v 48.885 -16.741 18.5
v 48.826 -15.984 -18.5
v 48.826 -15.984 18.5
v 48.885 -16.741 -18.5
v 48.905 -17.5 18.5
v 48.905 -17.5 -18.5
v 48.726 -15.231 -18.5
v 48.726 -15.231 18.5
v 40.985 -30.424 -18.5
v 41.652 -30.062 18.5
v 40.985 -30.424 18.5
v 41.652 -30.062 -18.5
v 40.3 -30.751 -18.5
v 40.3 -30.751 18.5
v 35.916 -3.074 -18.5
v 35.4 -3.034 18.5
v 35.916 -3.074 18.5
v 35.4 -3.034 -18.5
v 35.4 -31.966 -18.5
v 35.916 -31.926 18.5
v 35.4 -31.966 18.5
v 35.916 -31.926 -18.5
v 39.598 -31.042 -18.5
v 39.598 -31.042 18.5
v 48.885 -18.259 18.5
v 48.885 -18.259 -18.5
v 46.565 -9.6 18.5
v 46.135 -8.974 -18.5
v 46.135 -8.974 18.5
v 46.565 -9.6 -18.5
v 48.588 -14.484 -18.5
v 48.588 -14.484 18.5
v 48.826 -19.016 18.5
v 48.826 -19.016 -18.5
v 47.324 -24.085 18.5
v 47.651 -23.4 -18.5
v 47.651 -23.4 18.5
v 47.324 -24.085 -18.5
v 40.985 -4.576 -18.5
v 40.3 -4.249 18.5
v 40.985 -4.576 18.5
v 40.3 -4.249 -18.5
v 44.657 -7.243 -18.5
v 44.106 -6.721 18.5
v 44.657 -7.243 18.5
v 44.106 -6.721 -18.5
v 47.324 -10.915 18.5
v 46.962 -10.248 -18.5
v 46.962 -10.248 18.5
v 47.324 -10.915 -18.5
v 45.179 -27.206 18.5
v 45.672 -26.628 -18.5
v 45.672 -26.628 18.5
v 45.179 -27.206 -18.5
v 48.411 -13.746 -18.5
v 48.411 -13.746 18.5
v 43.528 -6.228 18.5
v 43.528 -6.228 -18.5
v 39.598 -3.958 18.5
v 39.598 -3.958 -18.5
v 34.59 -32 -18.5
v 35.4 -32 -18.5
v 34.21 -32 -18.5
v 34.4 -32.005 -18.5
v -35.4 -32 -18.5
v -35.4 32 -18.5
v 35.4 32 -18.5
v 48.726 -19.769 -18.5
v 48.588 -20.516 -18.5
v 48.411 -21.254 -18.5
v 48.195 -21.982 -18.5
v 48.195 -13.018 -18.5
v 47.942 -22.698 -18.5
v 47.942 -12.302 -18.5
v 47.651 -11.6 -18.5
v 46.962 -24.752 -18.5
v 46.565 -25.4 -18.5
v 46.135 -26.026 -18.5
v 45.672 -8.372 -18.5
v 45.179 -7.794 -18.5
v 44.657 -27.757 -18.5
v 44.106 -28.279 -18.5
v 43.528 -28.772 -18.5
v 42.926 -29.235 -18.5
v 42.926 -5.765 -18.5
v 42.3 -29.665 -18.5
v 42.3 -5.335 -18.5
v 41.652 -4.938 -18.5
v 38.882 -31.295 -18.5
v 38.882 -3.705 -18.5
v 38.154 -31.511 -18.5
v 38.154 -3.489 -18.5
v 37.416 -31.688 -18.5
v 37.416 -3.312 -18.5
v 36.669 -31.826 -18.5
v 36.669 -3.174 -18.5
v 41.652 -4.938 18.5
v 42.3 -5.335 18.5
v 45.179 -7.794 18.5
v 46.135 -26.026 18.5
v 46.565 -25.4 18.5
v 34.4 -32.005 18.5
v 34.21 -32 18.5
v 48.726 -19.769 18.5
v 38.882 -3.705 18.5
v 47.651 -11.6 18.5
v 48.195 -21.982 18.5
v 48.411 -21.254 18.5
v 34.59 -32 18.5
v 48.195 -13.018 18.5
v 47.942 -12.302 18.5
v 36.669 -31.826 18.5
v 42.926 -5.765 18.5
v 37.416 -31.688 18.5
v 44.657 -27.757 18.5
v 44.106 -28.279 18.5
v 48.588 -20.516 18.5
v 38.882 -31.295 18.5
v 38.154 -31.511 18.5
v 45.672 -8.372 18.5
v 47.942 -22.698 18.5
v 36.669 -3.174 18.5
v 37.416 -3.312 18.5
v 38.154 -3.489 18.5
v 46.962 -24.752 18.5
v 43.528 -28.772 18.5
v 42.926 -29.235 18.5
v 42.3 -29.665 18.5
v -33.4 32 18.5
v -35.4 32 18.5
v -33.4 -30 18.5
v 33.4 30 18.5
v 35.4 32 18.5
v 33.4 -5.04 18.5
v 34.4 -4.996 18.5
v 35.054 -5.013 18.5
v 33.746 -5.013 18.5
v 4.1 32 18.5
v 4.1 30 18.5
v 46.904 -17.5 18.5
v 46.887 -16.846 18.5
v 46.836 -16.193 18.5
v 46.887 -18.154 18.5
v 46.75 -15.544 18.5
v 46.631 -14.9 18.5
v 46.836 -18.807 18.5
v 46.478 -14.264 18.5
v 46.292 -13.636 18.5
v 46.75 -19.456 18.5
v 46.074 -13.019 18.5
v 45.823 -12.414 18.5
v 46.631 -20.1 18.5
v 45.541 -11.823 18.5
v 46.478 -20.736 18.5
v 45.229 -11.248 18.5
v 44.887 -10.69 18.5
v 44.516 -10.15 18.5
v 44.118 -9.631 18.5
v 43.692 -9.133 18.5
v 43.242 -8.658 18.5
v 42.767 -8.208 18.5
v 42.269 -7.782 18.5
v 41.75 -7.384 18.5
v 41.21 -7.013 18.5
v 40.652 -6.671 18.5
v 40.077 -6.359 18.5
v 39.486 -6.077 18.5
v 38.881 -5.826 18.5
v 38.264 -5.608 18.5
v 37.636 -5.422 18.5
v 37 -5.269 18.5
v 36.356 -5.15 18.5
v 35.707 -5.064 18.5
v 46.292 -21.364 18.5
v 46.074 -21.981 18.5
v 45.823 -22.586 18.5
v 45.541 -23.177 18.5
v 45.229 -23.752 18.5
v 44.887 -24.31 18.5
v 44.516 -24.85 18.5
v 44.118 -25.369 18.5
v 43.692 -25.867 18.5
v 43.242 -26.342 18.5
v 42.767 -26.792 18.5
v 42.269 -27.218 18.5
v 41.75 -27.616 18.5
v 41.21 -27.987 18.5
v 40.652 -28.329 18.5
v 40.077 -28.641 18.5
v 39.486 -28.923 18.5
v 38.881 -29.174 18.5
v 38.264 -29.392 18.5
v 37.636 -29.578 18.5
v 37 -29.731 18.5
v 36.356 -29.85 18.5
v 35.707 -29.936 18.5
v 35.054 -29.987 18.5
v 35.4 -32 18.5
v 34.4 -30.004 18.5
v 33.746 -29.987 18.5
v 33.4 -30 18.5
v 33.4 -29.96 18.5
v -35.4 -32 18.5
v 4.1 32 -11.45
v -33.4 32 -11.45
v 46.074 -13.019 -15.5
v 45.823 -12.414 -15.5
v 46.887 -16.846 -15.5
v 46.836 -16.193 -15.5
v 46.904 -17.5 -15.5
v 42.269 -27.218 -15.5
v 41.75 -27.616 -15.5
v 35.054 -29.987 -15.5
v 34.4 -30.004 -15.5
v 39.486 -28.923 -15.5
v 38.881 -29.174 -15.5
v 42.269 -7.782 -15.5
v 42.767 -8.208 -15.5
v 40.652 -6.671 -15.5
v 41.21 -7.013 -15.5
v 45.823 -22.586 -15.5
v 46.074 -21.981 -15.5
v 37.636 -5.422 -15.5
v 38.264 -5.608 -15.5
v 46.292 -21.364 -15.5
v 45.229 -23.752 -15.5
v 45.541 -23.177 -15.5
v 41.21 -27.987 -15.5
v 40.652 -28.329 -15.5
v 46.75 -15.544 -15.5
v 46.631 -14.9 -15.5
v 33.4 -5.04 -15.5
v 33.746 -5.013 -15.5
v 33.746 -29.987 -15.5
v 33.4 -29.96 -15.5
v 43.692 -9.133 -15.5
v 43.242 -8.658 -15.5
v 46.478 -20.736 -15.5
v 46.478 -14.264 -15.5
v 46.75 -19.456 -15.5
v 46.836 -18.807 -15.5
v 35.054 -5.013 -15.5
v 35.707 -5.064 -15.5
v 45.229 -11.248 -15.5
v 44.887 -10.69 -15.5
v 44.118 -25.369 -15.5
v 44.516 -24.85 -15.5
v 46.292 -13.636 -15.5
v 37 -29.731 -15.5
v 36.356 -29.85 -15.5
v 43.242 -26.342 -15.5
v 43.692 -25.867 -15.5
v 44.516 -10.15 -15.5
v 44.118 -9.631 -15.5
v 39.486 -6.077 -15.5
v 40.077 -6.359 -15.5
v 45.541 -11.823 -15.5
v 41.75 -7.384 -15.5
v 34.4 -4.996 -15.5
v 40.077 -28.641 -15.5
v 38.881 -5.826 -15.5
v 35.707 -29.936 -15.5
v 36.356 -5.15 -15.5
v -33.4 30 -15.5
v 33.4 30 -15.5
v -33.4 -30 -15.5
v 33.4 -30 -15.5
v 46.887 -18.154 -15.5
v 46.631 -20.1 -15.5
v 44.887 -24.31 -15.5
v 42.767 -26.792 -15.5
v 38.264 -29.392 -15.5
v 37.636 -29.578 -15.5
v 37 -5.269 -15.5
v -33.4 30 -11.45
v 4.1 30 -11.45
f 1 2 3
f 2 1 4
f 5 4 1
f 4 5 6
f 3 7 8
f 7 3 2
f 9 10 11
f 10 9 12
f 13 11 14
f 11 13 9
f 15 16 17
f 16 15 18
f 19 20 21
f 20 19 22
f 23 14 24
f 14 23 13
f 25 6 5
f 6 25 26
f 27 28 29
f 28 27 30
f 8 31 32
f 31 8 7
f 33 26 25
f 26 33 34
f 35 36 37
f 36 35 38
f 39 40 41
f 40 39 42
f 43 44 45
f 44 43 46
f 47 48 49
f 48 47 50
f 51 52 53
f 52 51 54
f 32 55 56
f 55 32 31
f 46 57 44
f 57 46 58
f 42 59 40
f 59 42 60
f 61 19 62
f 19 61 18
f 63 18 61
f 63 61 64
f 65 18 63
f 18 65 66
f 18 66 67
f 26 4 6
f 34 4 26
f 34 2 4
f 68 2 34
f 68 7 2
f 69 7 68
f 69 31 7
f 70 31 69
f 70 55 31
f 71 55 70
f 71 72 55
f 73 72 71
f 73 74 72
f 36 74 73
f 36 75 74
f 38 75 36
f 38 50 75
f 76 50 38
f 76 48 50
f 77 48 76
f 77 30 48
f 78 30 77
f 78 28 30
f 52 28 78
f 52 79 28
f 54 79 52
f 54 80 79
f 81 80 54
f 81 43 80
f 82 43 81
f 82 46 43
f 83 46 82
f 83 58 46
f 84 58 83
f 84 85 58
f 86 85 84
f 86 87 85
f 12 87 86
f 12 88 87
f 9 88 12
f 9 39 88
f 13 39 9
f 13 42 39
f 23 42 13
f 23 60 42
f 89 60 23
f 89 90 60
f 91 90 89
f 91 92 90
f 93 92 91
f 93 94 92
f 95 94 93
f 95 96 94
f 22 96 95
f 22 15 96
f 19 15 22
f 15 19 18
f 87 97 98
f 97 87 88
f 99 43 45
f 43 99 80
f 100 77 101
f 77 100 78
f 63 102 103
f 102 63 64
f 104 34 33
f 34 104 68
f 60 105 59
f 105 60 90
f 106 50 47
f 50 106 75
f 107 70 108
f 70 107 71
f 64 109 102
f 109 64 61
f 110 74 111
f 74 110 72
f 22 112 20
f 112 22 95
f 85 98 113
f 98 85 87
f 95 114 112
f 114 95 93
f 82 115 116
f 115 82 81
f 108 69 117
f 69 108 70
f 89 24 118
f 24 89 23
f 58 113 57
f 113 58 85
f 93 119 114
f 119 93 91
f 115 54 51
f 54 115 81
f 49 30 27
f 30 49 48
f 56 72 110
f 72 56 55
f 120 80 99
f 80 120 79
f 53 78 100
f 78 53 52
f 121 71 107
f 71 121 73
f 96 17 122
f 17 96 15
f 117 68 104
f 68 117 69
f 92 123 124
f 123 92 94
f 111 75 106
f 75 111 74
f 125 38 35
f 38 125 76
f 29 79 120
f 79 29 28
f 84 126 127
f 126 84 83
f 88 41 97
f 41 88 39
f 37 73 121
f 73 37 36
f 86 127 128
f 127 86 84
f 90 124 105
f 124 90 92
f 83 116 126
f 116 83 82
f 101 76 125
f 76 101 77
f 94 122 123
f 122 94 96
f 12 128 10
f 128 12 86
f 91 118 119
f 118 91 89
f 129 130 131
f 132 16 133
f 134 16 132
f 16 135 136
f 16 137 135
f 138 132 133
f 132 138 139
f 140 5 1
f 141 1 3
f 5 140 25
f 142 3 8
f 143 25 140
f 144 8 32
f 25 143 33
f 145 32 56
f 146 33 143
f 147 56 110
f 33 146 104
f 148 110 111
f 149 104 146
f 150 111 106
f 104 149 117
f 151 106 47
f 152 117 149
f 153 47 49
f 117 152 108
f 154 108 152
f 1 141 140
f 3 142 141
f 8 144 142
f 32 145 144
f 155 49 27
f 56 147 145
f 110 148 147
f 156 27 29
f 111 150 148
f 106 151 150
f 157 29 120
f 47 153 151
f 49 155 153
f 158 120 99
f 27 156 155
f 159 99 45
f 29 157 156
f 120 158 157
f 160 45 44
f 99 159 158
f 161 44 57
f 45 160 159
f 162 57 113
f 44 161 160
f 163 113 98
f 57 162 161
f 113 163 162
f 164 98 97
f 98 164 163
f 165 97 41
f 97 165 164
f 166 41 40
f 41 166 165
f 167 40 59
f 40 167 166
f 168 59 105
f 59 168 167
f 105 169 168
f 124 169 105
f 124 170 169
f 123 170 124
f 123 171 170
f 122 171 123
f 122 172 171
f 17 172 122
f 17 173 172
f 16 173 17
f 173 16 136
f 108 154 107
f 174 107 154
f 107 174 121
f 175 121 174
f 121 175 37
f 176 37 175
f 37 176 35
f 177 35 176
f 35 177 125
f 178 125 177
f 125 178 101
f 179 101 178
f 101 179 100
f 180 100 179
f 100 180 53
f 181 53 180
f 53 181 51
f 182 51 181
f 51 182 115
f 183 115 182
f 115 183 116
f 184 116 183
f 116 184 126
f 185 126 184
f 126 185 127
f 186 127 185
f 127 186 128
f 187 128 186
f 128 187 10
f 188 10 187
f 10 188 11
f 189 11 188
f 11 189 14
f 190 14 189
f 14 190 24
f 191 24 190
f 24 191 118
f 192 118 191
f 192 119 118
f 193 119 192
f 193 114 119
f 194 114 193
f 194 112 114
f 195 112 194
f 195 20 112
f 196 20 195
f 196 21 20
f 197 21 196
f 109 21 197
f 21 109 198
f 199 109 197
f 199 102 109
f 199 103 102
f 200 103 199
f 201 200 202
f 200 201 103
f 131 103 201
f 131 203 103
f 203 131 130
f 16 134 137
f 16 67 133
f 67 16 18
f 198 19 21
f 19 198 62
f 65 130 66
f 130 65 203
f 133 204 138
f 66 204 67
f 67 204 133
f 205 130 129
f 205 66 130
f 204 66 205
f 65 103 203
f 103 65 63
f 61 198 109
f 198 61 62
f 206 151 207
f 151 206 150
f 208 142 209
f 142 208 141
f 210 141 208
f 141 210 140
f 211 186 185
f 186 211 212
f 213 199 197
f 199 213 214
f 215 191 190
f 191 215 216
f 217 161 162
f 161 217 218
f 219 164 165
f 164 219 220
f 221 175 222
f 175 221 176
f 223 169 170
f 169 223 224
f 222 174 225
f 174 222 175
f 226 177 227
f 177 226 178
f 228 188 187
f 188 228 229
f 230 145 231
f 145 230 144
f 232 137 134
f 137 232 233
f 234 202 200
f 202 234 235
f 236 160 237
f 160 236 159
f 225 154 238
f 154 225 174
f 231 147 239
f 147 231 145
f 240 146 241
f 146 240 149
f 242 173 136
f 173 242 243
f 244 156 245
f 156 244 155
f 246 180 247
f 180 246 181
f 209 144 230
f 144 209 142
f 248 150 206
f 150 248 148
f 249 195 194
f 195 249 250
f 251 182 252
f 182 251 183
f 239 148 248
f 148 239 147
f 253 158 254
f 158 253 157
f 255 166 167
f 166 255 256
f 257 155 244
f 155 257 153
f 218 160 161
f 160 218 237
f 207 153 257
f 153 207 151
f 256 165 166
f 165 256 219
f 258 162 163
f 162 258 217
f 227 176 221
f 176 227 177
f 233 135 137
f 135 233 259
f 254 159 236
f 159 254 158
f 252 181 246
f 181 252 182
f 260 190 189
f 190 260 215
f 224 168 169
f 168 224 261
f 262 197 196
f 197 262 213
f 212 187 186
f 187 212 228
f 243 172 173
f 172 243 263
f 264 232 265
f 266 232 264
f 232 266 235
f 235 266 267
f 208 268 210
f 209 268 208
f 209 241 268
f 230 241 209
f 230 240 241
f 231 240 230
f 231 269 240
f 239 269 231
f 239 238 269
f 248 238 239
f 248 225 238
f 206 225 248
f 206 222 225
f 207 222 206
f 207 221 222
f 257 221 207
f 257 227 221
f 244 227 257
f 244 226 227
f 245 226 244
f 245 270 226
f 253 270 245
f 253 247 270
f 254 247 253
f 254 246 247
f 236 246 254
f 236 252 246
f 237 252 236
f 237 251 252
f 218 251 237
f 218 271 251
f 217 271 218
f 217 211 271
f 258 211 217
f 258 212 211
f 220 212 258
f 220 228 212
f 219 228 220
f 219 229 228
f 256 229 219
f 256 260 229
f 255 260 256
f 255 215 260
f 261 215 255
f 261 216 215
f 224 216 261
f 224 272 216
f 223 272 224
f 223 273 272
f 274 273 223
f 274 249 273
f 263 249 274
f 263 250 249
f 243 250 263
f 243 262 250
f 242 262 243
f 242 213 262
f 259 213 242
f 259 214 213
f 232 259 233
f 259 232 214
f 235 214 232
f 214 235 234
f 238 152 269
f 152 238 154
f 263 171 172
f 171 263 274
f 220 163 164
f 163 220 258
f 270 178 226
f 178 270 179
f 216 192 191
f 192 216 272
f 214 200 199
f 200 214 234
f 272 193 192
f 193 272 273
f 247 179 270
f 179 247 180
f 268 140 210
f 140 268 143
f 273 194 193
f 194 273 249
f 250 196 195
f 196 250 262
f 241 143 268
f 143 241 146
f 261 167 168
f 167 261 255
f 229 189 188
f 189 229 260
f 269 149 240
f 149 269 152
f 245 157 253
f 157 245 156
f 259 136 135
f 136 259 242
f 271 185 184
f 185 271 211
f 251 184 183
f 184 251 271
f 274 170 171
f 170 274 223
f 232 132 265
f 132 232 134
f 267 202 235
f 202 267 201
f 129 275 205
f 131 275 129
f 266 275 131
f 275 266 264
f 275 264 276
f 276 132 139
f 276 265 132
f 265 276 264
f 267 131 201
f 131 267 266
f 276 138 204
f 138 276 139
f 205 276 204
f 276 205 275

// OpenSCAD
// Customizable Tool Changer Purge Bucket
// Copyright: Olle Wreede 2020
// License: CC BY-SA

//CUSTOMIZER VARIABLES

/* [Base values] */

// Height in mm of bucket
height_of_bucket = 35; // [15:100]

// Width in mm of bucket
width_of_bucket = 66.8; // [60:0.2:75]

// Depth in mm of bucket
depth_of_bucket = 60; // [40:0.2:80]

// Cutout width in mm of wiper
wiper_cutout_width = 37.5; // [35:0.1:40]

// Cutout height in mm of wiper
wiper_cutout_height = 30; // [10:0.1:40]

// Thickness in mm of bucket walls
wall_thickness = 2; // [1:0.2:5]

// Diameter in mm of purge hole
diameter_of_purge_hole = 25; // [20:0.1:30]

//CUSTOMIZER VARIABLES END

/* [Hidden] */

$fn=120;
fudge = 0.1;

/* Helper modules */

module cylinder_outer(diameter, height, fn) {
   fudge = 1 / cos(180 / fn);
   cylinder(h=height, r=diameter / 2 * fudge, $fn=fn, center=true);
}

module cube_rounded(width, length, height, radius=1) {
	minkowski() {
		cube([width - 2 * radius, length - 2 * radius, height/2], center = true);
		cylinder(r = radius, h = height/2, center = true);
	}
}

/* Purge Bucket */

module purge_bucket(width, depth, height, cutout_width, cutout_height, diameter, thickness) {
    t = thickness * 2;

    difference() {
        union() {
            translate([width / 2 + thickness / 2, (diameter + t) / 2 - (depth + t) / 2, 0])
            cylinder_outer(diameter + t, height + thickness, $fn);
            
            cube([width + t, depth + t, height + thickness], center = true);
        }
        
        translate([0, 0, thickness]) {
            translate([width / 2 + thickness / 2, (diameter + t) / 2 - (depth + t) / 2, 0])
            cylinder_outer(diameter, height, $fn);

            cube([width, depth, height], center = true);
            
            translate([cutout_width / 2 - width / 2, depth / 2 + thickness / 2, height / 2 - cutout_height / 2 - thickness / 2 + fudge])
            cube([cutout_width, thickness + fudge, cutout_height + fudge], center = true);
        }
    }
}

purge_bucket(
    width = width_of_bucket,
    depth = depth_of_bucket,
    height = height_of_bucket,
    cutout_width = wiper_cutout_width,
    cutout_height = wiper_cutout_height,
    diameter = diameter_of_purge_hole,
    thickness = wall_thickness);
